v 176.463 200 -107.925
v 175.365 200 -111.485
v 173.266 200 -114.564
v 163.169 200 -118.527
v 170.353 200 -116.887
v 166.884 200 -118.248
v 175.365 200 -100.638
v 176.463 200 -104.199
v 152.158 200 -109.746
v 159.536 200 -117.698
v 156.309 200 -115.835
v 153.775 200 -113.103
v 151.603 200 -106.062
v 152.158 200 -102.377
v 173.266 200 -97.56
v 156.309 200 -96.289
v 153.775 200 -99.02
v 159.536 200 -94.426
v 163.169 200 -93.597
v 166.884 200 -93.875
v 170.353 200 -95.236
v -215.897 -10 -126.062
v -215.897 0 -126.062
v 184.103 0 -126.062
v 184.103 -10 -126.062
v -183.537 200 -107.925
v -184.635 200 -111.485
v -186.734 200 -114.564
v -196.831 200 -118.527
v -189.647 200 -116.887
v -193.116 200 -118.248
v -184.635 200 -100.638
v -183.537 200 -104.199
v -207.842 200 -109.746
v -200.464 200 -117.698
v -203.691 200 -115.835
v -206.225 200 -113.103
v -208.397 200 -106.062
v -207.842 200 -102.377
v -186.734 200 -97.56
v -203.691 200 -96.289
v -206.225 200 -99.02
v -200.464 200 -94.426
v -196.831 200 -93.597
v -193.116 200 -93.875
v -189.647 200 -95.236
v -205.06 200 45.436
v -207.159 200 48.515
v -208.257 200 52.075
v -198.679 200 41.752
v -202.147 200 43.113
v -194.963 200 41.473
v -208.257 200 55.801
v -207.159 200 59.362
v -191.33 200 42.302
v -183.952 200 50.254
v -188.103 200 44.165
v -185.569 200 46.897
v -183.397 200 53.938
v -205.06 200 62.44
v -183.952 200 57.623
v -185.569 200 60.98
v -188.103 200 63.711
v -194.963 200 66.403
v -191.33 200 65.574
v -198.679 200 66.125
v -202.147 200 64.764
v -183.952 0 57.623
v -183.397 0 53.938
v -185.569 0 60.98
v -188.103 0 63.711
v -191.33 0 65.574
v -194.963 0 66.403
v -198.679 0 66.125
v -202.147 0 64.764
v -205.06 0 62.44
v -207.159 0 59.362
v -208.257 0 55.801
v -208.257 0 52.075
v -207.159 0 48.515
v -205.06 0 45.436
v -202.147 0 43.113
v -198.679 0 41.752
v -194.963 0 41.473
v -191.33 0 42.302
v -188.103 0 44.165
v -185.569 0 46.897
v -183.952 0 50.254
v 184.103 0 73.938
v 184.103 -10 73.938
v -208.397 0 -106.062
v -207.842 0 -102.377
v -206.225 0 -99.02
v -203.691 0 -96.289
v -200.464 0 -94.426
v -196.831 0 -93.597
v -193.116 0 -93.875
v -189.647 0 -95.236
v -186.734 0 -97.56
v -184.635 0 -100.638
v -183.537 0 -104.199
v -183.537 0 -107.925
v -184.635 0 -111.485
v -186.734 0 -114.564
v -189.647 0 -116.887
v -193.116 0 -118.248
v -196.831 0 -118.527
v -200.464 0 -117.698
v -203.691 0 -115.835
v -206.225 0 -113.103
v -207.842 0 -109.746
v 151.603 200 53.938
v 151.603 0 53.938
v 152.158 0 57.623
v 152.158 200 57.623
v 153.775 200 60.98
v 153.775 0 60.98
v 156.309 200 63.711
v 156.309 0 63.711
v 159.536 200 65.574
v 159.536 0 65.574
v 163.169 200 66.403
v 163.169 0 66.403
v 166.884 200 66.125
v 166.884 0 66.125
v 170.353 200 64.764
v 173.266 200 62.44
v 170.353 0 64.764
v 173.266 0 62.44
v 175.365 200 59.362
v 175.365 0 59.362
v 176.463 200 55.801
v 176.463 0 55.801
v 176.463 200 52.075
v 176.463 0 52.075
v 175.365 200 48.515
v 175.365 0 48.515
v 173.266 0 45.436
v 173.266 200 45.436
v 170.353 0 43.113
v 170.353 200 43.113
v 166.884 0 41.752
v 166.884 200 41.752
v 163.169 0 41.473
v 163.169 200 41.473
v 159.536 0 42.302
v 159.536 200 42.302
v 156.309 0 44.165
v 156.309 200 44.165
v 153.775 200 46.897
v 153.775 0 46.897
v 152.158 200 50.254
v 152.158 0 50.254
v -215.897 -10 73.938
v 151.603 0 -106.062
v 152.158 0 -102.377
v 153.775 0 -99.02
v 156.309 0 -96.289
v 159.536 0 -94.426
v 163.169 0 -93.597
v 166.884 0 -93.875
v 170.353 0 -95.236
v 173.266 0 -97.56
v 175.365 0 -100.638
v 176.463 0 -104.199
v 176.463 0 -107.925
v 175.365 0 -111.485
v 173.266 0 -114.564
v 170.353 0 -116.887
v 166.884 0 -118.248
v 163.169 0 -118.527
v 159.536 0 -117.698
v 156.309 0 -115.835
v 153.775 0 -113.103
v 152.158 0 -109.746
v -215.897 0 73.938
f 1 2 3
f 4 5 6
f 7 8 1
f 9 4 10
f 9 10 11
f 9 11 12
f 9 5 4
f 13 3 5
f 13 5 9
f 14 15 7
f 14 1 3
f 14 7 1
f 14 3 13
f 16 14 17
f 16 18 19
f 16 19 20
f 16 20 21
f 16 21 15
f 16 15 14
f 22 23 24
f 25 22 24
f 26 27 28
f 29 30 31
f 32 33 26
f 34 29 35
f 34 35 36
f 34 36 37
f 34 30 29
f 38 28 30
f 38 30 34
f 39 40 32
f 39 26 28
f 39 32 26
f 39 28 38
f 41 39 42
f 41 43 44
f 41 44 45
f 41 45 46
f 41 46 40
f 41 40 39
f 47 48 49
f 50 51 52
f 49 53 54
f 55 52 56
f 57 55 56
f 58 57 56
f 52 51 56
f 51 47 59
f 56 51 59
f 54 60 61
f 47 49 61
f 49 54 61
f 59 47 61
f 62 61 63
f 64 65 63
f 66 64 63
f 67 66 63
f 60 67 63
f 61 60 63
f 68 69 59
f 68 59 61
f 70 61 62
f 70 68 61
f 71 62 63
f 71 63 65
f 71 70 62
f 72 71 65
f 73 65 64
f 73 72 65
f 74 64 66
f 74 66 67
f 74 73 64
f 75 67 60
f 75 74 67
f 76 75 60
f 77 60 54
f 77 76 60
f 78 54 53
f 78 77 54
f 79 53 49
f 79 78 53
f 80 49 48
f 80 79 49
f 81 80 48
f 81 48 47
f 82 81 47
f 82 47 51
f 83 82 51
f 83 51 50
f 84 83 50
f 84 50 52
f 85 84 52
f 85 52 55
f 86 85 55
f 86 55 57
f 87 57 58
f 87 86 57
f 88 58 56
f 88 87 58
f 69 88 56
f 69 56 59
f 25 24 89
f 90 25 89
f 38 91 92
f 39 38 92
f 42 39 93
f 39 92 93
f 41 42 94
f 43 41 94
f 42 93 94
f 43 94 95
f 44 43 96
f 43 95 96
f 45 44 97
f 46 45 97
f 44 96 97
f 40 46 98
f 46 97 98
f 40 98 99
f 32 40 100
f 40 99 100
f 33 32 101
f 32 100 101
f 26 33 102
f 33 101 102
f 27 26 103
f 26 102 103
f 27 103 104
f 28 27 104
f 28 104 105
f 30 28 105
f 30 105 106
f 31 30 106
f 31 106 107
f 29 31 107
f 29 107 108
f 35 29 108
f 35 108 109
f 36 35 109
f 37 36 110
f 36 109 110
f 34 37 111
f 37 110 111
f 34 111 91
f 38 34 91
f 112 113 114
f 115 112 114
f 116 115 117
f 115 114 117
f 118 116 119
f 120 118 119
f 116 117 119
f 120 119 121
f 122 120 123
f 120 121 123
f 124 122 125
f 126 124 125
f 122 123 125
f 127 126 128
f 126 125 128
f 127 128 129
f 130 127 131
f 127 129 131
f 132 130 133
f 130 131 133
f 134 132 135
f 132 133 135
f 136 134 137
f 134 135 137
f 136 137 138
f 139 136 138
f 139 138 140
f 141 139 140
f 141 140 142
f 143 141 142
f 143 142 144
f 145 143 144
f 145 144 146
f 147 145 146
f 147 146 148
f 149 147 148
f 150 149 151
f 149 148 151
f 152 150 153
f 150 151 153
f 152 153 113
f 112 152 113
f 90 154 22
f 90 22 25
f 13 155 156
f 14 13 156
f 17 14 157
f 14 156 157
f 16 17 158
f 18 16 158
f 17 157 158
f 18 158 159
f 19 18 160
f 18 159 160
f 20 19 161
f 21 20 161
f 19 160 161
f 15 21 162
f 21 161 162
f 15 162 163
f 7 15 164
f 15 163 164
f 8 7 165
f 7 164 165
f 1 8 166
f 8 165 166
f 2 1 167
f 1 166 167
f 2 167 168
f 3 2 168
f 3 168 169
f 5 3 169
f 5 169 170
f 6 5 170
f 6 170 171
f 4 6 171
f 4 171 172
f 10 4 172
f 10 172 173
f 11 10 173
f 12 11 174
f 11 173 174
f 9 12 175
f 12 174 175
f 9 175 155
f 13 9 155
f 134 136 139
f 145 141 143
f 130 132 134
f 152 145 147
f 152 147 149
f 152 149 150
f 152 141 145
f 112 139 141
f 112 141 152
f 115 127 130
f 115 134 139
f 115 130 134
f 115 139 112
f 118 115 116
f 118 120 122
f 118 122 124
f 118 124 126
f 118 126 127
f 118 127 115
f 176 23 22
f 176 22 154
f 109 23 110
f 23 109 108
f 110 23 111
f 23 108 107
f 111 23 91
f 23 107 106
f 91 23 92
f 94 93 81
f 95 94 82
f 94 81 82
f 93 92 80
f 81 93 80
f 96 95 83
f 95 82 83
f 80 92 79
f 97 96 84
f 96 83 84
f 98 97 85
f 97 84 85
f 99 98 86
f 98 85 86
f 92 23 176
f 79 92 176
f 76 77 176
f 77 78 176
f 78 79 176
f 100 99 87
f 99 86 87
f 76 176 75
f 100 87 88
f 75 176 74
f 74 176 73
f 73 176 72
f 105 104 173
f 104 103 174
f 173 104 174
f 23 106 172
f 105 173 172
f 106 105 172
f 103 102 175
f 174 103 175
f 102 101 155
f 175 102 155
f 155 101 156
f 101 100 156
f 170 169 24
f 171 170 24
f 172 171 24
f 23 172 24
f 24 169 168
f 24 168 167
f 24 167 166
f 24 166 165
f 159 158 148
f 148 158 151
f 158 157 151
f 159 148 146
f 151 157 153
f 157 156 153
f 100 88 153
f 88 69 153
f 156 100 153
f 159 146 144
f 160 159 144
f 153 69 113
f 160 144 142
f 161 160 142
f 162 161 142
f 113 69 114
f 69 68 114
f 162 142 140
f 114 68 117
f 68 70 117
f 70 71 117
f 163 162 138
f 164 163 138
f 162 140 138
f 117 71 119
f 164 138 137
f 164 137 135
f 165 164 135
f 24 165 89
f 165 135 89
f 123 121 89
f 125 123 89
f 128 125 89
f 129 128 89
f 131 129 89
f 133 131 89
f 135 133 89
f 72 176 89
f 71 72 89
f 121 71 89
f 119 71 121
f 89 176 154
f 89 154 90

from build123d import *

# Parameters (mm, degrees)
F0_W     = 400
F0_H     = 200
F1_DEPTH = 10
F2_R     = 12.5
F3_DEPTH = 200
F4_R     = 12.5
F5_DEPTH = 200


with BuildPart() as f1:
    # F0 (on Front) → F1 (new body)
    with BuildSketch(Plane.XZ):
        with Locations((-15.897054, -26.061756)):
            Rectangle(F0_W, F0_H)
    extrude(amount=F1_DEPTH)

    # F2 (on Front) → F3 (join)
    with BuildSketch(Plane.XZ):
        with Locations((-195.897054, 53.938244)):
            Circle(F2_R)
    extrude(amount=-F3_DEPTH)

    # F4 (on face) → F5 (join)
    with BuildSketch(Plane(origin=(0, 0, 0), x_dir=(-1, 0, 0), z_dir=(0, 1, 0))):
        with Locations((-164.102946, 53.938244)):
            Circle(F4_R)
        with Locations((-164.102946, -106.061756)):
            Circle(F4_R)
        with Locations((195.897054, -106.061756)):
            Circle(F4_R)
    extrude(amount=F5_DEPTH)


solid = f1.part
